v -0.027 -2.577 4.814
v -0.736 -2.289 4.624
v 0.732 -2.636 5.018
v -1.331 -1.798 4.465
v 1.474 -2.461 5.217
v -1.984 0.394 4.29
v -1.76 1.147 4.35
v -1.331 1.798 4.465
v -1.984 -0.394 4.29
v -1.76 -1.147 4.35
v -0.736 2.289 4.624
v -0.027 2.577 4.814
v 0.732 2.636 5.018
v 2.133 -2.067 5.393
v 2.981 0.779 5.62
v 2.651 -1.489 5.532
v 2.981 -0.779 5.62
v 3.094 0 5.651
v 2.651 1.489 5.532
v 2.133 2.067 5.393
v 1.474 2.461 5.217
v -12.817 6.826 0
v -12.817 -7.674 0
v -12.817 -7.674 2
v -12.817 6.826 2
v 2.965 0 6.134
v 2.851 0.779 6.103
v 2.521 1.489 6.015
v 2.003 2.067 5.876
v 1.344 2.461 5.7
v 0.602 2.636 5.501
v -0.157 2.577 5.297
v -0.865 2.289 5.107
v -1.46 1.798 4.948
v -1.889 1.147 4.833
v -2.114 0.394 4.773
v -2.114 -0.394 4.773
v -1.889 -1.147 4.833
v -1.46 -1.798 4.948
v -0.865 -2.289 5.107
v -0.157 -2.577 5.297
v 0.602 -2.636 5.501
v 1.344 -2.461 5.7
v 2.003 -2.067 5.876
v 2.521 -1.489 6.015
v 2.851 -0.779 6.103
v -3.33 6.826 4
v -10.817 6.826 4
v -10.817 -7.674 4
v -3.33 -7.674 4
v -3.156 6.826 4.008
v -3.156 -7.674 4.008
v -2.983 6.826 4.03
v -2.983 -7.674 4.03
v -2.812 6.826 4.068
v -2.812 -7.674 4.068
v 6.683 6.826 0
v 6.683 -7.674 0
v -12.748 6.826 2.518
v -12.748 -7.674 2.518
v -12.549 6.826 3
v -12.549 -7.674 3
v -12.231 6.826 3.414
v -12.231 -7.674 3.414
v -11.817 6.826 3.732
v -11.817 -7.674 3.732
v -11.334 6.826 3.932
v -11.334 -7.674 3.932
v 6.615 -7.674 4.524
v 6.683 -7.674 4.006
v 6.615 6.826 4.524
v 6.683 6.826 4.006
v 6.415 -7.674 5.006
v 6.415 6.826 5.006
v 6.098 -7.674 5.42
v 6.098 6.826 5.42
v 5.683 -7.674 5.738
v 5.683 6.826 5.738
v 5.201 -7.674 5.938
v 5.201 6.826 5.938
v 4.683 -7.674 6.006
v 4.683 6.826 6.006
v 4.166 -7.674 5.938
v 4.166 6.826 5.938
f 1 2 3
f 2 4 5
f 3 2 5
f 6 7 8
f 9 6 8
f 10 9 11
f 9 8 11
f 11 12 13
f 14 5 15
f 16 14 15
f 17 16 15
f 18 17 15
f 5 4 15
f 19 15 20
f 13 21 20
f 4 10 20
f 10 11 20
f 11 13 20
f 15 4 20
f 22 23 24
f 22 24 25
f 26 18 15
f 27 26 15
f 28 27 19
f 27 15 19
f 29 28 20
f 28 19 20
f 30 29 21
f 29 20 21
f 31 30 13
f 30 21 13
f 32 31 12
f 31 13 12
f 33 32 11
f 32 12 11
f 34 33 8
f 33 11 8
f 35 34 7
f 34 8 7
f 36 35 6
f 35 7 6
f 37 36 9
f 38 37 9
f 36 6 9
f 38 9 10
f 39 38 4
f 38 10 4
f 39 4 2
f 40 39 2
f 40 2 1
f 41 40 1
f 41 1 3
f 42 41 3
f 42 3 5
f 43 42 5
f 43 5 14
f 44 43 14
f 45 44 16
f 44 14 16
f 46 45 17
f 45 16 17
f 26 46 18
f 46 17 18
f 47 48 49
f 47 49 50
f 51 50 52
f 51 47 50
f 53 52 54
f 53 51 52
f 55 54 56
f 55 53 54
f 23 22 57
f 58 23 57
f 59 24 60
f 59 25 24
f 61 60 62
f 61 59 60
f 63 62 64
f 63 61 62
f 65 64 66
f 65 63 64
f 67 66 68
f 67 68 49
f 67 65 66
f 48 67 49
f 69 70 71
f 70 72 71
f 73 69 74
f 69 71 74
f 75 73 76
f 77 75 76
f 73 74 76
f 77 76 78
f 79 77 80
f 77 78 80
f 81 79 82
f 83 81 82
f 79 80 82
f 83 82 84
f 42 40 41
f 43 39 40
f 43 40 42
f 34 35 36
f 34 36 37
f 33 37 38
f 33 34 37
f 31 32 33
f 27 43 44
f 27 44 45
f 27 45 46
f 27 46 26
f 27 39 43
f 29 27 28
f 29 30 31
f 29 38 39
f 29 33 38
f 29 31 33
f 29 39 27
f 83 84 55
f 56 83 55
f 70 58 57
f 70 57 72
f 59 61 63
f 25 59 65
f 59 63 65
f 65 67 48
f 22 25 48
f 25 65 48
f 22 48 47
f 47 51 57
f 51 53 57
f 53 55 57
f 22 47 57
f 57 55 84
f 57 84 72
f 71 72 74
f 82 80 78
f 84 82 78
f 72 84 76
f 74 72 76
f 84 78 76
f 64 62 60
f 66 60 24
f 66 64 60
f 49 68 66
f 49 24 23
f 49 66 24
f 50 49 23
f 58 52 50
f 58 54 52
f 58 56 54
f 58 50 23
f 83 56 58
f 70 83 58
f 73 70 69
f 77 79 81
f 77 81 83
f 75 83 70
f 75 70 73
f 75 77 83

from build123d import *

# Parameters (mm, degrees)
F0_W     = 19.5
F0_H     = 14.5
F1_DEPTH = 4
F3_DEPTH = 14.5
F4_R     = 2
F5_R     = 2.6435709846
F6_DEPTH = 0.5


with BuildPart() as f1:
    # F0 (on Top) → F1 (new body)
    with BuildSketch(Plane.XY):
        with Locations((-3.0665891245, -0.4237584708)):
            Rectangle(F0_W, F0_H)
    extrude(amount=F1_DEPTH)

    # F2 (on face) → F3 (join)
    with BuildSketch(Plane.XZ.offset(7.6737584708)):
        Polygon((-3.0665891245, 4), (6.6834108755, 4), (6.6834108755, 6.6125046262), align=None)
    extrude(amount=-F3_DEPTH)

    # F4
    f4_edges = [f1.edges().sort_by_distance(p)[0] for p in [
        (-3.066589, -0.423758, 4),
        (6.683411, -0.423758, 6.612505),
        (-12.816589, -0.423758, 4),
    ]]
    fillet(f4_edges, radius=F4_R)


with BuildPart() as f6:
    # F5 (on face) → F6 (new body)
    with BuildSketch(Plane(origin=(-1.2054225199, 0, 4.4986980887), x_dir=(0.9659258263, 0, 0.2588190451), z_dir=(-0.2588190451, 0, 0.9659258263))):
        with Locations((1.8078176072, 0)):
            Circle(F5_R)
    extrude(amount=F6_DEPTH)


solid = Compound([f1.part, f6.part])
